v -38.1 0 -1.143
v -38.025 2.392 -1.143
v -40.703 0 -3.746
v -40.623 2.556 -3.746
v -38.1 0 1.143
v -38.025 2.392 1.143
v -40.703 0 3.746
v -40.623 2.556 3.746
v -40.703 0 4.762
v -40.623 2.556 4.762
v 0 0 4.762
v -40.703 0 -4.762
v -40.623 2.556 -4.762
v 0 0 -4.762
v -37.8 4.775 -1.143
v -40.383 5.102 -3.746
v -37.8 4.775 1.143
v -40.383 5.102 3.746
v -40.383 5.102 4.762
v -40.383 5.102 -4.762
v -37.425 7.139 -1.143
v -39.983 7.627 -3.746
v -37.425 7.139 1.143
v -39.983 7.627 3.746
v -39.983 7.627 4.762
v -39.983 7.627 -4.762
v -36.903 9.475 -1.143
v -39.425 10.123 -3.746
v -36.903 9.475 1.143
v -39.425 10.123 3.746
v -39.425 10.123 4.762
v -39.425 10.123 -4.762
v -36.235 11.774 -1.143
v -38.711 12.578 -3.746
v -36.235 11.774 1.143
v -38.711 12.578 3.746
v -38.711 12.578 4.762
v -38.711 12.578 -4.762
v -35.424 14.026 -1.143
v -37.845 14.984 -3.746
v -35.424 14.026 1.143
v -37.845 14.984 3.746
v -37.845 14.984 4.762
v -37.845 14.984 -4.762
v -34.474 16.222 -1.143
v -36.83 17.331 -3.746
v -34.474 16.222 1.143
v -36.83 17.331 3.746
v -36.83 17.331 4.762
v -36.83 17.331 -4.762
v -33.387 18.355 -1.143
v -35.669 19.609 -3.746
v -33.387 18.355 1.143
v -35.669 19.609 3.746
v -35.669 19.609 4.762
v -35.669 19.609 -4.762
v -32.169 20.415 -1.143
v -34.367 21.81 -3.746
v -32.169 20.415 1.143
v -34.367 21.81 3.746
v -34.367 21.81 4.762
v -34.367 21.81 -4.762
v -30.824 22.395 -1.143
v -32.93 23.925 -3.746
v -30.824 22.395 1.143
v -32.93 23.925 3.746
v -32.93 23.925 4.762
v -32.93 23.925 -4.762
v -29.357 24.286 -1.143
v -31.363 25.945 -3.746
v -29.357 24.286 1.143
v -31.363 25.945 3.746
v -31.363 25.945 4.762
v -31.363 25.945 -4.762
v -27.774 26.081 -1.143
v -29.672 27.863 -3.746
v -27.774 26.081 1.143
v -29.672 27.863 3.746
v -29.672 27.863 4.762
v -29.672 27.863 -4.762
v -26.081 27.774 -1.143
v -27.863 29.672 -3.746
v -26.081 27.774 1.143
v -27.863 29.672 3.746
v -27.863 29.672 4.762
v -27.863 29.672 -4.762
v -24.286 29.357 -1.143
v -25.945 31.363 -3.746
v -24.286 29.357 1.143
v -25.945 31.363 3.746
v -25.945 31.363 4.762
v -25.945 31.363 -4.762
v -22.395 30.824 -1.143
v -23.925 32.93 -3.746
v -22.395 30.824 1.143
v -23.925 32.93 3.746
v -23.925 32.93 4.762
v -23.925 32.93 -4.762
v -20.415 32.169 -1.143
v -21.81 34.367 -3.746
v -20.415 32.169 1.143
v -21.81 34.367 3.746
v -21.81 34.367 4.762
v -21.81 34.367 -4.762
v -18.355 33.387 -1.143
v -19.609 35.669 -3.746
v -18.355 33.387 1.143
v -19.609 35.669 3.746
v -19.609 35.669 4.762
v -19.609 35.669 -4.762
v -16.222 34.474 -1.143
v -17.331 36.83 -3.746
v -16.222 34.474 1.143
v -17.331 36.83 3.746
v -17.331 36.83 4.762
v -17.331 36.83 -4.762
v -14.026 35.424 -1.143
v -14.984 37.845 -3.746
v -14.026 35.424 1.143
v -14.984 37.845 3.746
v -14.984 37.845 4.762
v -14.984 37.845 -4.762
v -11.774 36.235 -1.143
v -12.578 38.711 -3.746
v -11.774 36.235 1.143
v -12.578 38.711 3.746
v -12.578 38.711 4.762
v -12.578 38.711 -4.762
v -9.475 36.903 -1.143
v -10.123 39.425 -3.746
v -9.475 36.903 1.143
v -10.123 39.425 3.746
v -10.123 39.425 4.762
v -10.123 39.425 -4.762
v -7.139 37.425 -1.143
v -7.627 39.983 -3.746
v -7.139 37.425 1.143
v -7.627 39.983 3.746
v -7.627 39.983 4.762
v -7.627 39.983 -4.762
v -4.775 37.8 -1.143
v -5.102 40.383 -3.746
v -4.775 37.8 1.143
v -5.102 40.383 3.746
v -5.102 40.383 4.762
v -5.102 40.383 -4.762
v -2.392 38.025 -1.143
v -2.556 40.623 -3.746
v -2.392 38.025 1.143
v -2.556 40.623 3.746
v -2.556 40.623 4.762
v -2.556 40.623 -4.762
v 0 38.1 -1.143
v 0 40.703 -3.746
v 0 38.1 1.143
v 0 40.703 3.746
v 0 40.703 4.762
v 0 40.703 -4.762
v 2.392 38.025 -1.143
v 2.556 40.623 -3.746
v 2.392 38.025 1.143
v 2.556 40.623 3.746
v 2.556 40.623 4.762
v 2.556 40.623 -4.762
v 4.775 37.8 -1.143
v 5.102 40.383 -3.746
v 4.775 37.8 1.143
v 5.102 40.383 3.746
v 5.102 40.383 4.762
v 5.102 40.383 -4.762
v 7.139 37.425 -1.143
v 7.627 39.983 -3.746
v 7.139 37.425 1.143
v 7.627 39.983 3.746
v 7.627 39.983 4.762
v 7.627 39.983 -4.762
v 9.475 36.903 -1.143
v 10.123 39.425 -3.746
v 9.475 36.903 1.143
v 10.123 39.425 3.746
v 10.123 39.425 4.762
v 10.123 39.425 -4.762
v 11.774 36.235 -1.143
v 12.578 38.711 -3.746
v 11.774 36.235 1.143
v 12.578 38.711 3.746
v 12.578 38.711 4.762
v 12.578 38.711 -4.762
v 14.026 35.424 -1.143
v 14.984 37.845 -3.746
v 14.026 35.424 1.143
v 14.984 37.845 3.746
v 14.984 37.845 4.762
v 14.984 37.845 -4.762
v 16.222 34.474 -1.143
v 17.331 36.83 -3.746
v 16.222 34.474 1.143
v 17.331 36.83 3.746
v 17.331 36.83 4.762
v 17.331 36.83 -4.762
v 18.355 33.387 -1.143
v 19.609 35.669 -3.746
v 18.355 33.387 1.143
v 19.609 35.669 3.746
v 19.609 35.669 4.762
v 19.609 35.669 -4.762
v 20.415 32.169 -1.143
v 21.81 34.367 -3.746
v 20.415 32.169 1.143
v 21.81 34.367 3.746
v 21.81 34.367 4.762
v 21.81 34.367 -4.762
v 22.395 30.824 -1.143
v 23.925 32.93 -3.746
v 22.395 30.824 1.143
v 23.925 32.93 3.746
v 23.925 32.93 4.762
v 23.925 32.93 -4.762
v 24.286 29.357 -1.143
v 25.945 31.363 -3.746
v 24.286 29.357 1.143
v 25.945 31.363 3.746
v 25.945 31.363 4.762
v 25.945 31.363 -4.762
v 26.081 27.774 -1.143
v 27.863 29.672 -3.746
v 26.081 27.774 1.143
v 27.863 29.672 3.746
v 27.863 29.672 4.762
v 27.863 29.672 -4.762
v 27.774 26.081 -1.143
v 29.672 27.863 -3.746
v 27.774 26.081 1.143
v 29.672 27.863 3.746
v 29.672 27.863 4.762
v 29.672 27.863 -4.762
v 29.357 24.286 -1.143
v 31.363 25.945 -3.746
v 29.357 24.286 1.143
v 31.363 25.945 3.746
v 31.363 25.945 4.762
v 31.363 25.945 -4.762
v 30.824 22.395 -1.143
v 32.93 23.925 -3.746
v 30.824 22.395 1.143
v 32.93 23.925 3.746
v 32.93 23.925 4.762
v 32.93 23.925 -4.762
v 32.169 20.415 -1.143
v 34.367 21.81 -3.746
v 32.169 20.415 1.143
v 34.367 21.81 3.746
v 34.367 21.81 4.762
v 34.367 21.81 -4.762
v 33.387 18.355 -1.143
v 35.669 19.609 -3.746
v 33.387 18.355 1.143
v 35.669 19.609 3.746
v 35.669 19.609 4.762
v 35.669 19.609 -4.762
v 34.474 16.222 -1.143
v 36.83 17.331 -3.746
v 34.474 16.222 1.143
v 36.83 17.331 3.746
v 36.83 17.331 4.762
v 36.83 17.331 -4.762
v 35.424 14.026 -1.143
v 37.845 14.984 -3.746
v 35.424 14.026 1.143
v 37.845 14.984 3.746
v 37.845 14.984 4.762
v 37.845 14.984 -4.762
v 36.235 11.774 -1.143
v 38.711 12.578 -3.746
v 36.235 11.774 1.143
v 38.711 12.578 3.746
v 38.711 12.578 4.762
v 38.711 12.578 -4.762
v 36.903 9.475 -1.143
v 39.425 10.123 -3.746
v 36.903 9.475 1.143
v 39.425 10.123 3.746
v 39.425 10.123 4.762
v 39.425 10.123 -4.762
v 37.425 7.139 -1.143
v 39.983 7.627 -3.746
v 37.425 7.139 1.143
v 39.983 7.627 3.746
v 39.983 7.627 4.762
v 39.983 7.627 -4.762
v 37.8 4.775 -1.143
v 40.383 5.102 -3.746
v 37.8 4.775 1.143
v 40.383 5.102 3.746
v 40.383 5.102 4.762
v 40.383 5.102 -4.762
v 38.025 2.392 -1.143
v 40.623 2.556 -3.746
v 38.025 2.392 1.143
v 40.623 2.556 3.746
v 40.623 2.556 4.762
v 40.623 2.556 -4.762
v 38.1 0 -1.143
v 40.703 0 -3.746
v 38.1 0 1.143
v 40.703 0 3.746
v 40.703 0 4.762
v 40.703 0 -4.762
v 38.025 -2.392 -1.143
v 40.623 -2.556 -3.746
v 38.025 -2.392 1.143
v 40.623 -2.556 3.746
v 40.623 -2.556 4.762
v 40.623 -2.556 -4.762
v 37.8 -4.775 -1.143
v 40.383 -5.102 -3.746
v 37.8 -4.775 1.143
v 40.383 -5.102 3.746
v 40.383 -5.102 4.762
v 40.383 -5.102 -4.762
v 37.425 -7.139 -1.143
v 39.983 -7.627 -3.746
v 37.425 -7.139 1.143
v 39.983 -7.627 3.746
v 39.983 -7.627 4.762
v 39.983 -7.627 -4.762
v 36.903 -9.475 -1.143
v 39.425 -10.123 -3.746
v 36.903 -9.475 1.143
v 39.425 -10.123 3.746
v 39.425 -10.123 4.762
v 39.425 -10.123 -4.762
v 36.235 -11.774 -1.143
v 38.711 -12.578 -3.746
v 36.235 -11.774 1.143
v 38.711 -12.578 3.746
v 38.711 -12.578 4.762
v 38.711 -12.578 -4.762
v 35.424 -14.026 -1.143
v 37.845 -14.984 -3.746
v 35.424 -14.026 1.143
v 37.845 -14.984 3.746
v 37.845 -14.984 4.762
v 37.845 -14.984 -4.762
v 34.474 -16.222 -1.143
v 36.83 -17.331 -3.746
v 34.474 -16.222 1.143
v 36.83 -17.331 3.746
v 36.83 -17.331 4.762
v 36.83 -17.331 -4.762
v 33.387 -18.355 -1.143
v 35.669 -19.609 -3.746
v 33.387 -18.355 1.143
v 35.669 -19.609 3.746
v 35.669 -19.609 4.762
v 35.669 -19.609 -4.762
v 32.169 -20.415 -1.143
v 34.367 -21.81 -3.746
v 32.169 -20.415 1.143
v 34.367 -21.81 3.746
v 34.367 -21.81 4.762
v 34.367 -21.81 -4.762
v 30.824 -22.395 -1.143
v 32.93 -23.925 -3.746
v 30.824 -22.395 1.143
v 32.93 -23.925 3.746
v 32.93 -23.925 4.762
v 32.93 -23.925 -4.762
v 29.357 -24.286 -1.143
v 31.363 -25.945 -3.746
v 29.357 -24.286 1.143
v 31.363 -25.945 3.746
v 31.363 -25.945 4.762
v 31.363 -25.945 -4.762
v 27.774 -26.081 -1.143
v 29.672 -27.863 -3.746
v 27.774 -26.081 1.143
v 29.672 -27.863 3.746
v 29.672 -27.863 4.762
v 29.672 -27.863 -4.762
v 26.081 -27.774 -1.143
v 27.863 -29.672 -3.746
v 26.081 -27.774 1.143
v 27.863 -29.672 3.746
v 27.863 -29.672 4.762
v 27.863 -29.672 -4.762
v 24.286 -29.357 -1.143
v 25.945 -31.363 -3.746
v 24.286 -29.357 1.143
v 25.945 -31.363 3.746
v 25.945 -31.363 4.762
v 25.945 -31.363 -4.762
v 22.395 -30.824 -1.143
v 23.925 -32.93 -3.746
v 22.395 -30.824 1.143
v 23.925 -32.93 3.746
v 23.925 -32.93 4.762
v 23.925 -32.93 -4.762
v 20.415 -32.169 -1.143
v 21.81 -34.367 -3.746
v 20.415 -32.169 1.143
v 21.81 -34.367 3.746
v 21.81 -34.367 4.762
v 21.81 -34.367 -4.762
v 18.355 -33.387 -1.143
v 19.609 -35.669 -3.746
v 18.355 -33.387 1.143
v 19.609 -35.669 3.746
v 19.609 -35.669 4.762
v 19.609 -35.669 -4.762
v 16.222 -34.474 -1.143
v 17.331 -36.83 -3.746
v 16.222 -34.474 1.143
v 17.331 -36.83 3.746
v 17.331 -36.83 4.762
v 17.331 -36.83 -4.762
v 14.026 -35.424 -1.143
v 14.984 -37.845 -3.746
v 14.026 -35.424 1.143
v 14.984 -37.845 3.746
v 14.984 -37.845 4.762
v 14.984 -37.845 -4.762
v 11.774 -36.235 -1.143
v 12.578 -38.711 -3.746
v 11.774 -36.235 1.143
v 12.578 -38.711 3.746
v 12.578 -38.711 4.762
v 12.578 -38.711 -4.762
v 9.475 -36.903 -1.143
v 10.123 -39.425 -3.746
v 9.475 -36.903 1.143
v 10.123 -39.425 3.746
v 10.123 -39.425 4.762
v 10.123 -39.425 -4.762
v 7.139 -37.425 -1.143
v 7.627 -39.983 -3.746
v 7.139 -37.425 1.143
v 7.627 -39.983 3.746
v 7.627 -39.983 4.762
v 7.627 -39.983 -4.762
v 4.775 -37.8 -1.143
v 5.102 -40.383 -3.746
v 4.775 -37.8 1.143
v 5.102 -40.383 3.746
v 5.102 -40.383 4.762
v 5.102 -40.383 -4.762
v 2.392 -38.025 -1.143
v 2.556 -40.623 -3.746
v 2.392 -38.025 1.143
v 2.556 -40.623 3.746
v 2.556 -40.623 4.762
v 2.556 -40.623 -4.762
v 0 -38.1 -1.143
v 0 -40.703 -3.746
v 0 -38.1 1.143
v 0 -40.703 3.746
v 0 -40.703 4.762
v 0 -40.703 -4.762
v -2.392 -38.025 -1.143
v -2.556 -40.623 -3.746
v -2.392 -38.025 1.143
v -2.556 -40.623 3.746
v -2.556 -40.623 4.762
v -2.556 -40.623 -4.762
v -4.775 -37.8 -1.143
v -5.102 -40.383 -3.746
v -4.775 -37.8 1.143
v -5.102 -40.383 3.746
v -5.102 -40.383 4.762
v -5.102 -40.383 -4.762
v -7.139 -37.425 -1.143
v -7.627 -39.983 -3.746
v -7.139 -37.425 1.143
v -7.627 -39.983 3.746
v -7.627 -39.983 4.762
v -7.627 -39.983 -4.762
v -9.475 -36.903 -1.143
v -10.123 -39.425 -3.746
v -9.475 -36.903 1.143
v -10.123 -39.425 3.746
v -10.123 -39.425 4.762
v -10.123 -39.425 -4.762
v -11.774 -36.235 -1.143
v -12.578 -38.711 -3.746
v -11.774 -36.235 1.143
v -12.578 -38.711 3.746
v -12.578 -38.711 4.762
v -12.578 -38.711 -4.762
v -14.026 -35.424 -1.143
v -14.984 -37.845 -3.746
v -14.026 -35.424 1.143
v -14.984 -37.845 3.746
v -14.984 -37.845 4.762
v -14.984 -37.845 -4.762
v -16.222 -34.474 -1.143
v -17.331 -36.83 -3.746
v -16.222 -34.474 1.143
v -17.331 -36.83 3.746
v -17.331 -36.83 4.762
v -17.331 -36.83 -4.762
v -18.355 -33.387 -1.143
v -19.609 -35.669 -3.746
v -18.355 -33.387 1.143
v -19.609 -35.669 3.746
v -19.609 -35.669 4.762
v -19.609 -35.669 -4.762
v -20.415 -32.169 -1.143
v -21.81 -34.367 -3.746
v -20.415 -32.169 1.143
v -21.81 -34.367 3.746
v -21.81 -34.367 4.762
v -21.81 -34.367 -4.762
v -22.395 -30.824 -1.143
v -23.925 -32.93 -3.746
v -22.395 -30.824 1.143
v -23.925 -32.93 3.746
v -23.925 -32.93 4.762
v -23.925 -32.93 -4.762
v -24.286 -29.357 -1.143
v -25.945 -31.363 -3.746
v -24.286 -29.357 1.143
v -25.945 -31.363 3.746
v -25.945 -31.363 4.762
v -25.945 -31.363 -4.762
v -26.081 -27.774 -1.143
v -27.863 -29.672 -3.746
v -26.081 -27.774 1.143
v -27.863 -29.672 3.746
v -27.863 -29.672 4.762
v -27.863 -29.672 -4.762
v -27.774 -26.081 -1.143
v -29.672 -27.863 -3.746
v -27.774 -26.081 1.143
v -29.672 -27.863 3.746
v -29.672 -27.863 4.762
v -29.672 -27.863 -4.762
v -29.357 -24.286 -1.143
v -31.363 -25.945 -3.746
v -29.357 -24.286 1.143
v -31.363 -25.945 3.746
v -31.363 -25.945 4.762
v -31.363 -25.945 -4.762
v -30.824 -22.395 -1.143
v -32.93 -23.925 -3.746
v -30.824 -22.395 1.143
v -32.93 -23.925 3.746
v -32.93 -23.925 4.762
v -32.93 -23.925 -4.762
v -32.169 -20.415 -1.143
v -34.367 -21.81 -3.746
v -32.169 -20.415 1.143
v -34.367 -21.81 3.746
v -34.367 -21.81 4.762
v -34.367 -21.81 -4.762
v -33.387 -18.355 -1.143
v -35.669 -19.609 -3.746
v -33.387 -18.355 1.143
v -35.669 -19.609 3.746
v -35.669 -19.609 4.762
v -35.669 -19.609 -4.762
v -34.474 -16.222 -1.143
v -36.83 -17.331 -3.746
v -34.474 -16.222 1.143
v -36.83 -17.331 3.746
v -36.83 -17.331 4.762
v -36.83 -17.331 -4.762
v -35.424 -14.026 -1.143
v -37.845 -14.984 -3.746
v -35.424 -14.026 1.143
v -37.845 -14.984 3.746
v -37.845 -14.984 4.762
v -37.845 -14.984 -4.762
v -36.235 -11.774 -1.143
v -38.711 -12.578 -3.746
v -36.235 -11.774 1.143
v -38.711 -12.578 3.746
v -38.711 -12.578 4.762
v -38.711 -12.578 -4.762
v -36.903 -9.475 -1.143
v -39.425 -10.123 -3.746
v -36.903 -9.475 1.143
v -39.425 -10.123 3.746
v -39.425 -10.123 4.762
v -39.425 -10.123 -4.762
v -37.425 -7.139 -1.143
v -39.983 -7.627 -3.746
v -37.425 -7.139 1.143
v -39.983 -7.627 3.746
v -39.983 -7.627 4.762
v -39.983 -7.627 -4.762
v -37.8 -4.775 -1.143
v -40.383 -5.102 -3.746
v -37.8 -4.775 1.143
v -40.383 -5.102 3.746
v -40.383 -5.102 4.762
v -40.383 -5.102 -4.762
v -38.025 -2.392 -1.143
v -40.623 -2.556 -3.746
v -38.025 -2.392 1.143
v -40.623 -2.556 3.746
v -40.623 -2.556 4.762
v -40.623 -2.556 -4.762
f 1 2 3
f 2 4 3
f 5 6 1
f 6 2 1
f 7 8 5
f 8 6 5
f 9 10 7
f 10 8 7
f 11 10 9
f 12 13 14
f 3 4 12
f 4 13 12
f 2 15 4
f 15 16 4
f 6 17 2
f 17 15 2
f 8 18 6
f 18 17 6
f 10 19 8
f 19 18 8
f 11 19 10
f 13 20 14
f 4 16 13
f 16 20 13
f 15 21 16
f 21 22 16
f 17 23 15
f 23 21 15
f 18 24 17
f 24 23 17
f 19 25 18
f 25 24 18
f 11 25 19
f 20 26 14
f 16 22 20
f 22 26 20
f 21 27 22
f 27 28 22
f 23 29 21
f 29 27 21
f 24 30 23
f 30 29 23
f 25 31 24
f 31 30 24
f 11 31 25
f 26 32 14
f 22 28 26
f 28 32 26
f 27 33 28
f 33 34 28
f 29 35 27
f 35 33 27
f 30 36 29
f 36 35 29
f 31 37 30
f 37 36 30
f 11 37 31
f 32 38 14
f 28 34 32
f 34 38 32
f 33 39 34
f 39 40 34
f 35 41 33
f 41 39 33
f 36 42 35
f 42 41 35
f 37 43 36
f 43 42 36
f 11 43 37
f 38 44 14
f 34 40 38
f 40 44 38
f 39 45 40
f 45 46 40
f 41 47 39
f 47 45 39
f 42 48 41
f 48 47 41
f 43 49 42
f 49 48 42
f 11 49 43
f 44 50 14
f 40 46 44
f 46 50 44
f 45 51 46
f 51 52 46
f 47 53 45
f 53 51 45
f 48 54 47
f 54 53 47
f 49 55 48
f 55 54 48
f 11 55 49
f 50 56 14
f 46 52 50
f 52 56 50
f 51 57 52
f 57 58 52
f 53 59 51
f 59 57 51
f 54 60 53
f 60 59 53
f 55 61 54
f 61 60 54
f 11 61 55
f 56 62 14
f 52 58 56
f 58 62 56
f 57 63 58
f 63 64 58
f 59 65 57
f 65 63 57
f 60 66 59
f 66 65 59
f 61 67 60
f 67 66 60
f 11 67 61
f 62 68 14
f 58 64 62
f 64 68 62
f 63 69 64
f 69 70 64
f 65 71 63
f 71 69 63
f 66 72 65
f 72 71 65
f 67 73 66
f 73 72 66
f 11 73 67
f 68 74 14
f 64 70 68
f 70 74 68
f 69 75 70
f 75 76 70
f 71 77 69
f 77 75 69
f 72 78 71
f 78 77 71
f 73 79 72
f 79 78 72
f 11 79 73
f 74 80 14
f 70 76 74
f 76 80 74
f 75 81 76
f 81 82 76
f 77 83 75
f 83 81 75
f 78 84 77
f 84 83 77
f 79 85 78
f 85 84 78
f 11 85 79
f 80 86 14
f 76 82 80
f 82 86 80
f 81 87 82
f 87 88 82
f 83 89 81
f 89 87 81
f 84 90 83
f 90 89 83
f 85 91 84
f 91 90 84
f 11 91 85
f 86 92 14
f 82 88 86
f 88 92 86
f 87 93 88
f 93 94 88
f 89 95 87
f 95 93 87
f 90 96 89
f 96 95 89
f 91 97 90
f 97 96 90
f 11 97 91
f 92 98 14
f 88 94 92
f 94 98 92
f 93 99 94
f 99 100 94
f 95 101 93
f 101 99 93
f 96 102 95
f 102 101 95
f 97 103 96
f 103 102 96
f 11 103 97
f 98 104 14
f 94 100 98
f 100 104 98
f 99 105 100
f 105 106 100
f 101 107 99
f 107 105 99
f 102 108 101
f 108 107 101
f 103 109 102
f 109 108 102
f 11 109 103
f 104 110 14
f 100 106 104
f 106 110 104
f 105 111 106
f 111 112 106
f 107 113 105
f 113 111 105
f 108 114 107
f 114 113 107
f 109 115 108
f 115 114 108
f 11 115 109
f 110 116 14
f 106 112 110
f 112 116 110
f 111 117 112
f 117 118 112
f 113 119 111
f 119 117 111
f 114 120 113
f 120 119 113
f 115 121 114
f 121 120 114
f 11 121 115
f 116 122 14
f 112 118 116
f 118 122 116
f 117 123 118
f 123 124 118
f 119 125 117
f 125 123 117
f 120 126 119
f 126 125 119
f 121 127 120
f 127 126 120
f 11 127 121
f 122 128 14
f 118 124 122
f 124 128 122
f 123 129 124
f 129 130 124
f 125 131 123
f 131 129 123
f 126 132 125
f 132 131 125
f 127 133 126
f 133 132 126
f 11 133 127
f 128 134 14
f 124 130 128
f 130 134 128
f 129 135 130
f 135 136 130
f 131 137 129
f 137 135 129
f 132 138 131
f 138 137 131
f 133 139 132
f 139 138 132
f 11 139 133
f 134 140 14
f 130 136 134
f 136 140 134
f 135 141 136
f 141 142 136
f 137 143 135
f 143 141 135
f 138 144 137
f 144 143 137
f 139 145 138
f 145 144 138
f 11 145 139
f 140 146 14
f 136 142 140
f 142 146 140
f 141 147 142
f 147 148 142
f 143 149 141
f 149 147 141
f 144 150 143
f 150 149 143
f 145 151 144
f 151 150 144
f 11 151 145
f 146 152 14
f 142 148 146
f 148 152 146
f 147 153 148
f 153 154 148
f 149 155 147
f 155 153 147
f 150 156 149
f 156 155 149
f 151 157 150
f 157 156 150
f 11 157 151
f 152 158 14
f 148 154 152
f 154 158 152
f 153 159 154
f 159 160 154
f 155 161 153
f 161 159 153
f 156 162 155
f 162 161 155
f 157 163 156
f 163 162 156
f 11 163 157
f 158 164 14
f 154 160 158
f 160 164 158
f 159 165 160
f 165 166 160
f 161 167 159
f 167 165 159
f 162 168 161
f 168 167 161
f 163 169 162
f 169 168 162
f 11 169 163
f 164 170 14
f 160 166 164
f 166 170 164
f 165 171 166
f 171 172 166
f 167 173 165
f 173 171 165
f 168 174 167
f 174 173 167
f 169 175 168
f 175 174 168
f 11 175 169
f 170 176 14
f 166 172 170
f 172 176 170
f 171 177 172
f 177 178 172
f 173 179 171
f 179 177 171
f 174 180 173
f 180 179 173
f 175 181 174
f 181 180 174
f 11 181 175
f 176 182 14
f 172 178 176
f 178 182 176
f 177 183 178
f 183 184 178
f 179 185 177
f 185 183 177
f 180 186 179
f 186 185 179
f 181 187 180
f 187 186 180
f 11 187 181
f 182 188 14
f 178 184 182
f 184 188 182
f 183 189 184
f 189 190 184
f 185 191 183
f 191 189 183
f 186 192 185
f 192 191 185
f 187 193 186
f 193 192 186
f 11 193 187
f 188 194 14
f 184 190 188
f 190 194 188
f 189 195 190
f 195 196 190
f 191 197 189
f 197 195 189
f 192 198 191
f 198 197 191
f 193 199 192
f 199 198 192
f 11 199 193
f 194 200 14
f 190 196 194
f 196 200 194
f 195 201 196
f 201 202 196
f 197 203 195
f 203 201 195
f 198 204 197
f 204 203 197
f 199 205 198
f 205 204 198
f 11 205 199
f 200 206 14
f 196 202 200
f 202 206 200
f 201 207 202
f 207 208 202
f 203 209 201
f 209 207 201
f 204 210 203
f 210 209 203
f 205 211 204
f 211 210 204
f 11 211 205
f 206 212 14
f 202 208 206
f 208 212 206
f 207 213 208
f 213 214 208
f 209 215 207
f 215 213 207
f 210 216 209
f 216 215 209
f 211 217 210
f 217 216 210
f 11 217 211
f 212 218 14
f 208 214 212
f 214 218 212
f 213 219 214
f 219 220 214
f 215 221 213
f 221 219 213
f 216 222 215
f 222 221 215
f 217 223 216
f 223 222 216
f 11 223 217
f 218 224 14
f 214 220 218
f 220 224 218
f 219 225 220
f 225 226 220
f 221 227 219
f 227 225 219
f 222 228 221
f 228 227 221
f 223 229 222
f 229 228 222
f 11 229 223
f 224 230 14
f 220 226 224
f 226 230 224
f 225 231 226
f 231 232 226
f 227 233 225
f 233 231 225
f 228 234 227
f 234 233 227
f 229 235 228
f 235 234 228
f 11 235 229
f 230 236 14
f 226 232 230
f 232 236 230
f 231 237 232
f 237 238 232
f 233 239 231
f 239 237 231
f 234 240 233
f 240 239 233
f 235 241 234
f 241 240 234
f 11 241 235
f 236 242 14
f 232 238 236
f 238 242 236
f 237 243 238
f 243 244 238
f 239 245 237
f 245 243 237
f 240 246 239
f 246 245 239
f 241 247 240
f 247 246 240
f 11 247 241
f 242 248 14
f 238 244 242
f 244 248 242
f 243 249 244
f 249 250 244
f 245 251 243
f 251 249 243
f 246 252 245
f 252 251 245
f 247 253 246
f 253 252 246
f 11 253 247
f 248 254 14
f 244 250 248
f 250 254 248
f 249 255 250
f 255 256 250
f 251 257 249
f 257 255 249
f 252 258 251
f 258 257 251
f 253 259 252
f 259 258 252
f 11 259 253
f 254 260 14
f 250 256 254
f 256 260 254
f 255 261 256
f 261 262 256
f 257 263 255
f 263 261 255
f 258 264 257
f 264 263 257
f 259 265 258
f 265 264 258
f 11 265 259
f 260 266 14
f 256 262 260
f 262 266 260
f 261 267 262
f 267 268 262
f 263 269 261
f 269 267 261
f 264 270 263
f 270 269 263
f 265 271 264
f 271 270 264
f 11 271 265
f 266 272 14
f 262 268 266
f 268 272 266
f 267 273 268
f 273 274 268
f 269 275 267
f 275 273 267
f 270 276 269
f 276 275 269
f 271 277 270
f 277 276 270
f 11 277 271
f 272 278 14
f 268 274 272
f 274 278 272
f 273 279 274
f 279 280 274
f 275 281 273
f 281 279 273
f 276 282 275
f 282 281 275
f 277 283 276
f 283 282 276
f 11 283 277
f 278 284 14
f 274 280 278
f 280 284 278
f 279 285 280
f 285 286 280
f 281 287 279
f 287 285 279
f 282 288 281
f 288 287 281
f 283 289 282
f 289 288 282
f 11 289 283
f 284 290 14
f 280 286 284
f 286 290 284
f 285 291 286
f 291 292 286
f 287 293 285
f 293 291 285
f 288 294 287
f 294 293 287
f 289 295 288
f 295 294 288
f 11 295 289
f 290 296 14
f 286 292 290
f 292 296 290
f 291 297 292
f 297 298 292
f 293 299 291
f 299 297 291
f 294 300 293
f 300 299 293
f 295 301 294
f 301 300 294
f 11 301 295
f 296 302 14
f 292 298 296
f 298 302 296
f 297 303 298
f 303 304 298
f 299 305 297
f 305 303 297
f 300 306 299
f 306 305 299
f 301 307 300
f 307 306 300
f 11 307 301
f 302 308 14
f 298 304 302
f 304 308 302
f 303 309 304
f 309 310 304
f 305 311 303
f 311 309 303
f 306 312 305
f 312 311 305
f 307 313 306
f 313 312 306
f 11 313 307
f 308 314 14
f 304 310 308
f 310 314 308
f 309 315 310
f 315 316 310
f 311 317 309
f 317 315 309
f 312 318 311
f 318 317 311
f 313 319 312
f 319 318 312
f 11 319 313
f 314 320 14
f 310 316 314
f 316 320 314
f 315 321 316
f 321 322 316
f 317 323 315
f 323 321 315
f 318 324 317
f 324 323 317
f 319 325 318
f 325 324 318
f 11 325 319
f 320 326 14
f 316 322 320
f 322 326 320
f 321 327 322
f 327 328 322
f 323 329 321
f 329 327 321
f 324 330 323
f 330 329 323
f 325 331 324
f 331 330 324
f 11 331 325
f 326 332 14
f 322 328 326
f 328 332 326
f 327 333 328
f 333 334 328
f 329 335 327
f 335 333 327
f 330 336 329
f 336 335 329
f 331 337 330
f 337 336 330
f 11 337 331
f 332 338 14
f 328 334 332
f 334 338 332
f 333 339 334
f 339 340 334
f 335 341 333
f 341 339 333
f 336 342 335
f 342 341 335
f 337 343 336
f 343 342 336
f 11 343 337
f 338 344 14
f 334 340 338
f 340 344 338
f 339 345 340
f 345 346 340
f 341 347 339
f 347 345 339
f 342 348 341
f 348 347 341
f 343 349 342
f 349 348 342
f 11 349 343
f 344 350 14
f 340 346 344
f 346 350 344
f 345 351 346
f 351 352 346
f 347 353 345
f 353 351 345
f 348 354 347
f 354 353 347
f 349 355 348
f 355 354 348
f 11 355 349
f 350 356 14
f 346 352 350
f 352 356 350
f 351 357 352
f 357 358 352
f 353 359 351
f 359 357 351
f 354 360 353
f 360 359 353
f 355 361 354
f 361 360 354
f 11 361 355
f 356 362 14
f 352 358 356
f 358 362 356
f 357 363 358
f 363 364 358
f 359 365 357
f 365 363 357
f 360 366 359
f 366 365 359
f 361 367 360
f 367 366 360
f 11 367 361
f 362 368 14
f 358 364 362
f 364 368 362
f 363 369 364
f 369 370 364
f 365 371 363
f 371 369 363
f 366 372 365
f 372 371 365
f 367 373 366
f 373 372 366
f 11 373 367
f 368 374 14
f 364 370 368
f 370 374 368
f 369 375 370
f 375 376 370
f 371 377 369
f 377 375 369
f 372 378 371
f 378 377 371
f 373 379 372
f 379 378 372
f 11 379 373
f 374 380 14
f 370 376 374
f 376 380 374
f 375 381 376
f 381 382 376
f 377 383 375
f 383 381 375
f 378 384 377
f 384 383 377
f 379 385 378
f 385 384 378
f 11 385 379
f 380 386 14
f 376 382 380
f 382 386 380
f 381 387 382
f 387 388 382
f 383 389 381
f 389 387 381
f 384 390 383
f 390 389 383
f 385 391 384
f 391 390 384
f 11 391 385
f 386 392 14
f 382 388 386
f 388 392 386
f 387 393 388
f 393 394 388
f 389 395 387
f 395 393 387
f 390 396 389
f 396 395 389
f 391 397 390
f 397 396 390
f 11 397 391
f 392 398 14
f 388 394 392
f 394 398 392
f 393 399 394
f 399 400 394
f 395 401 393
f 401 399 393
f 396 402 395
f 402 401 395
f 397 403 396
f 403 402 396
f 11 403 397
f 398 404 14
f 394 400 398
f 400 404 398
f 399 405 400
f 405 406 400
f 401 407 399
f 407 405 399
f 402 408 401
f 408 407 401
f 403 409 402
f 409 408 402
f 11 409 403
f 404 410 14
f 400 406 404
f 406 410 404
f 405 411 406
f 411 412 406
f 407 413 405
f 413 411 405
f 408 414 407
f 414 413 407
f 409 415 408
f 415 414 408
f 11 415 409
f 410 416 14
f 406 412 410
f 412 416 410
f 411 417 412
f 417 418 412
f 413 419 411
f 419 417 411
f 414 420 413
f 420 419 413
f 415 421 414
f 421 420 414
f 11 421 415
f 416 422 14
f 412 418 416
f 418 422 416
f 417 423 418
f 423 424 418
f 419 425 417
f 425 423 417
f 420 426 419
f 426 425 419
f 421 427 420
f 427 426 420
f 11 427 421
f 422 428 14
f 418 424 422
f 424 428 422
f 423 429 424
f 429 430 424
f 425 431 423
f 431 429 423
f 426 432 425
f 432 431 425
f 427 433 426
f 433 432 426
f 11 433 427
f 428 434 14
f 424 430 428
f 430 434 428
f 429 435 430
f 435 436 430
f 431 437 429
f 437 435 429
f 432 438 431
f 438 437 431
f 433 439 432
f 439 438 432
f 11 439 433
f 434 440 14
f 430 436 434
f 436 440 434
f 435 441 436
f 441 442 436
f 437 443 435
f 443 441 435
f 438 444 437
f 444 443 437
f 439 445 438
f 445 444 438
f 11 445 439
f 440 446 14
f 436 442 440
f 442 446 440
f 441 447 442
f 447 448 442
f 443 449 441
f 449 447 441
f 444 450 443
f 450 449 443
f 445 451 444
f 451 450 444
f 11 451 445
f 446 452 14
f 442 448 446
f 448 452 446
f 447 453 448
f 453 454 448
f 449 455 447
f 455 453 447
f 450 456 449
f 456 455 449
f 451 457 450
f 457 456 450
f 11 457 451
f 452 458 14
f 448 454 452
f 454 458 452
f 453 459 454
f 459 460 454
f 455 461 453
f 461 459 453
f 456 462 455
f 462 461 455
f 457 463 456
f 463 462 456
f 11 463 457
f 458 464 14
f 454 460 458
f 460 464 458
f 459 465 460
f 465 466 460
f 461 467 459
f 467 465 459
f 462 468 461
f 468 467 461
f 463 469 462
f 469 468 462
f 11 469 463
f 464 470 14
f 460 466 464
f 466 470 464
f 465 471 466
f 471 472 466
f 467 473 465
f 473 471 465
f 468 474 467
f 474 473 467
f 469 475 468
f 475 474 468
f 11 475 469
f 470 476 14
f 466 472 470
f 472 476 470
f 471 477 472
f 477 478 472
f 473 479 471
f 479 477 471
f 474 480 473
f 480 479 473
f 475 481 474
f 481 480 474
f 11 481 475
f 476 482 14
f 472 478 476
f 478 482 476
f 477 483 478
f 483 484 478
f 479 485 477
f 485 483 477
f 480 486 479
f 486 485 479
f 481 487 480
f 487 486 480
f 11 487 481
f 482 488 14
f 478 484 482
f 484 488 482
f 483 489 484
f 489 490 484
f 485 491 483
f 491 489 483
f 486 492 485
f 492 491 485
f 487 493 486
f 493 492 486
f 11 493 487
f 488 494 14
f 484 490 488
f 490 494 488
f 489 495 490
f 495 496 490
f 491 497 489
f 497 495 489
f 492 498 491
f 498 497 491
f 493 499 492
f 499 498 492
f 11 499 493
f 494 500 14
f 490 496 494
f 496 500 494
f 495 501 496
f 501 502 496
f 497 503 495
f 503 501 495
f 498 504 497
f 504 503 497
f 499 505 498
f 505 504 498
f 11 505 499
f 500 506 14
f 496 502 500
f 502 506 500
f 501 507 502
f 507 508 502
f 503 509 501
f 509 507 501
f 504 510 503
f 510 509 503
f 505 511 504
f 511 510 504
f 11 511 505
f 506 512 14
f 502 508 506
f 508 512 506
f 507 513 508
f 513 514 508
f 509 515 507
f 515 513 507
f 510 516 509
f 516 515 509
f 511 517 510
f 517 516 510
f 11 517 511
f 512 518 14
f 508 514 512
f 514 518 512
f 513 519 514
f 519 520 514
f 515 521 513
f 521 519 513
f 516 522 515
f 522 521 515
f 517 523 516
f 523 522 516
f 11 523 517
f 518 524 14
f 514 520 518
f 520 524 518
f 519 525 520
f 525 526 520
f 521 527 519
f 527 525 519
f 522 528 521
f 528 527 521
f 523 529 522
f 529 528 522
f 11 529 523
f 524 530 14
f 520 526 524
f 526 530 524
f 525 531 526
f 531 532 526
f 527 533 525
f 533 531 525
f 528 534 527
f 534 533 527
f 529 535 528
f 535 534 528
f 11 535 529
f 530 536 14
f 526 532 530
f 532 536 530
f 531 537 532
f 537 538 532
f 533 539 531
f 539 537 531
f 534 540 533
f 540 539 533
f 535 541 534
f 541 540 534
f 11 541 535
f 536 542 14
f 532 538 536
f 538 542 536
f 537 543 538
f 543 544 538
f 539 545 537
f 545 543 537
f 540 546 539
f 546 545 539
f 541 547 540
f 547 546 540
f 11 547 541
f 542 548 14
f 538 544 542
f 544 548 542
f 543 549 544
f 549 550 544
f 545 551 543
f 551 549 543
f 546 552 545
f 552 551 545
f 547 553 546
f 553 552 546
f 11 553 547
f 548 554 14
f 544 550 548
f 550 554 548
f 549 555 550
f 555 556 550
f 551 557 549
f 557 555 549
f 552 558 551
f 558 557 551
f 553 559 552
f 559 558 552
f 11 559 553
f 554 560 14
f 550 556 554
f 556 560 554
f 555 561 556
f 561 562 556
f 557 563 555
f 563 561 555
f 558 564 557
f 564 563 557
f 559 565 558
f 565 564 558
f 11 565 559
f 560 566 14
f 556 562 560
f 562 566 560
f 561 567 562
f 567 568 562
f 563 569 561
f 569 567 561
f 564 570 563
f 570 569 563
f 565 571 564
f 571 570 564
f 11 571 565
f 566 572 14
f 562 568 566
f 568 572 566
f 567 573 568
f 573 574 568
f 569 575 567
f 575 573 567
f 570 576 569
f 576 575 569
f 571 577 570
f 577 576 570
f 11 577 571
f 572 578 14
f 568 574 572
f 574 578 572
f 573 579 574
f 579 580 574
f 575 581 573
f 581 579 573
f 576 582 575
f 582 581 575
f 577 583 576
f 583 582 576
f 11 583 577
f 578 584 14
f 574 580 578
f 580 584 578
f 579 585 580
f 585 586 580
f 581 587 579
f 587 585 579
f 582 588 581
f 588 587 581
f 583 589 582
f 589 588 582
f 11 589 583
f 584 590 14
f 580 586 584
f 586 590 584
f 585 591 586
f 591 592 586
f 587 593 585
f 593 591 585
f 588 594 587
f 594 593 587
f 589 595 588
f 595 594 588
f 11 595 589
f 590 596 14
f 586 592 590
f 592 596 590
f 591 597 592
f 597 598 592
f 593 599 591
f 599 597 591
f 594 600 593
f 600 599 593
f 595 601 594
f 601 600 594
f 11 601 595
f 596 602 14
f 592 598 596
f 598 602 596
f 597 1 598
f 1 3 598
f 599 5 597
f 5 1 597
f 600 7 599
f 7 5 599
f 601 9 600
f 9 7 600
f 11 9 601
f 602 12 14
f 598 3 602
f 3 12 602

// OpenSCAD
//
// Parametric design for a pulley with holes compatible with Actobotics 0.770"
// servo horns, with a center hole to permit subsequent attachment of horn to servo
// by feeding through a screw for the shaft.
//
// This work is licensed under the Creative Commons Attribution-ShareAlike 4.0
// International License. To view a copy of this license, visit
// http://creativecommons.org/licenses/by-sa/4.0/ or send a letter to
// Creative Commons, PO Box 1866, Mountain View, CA 94042, USA.
//
// Tun up precision = slower render time.
$fn = 100;

// Values specified in inches ...
mmPerInch = 25.4;

//
// Parameters for the profile of the pulley.  We revolve the profile around the Z-axis to produce the pulley.
//
// The pulley is size off of the pulley track diameter (e.g. pulleyInsideDiam), because this is what matters
// for translating rotation to linear distance.  The side walls are there just to keep to string from falling
// off the pulley and the overhang angle in there to permit this part to be FDM printable.  Additionally, 
// because we don't want the outside edge to be sharp, a lipThickness is added in ... because if the string 
// falls outside of the track and then engages, you don't want fraying.
//

pulleyInsideDiam = 3.0 * mmPerInch;
thick = 0.375 * mmPerInch;             // overall thickness
lipThickness = 0.040 * mmPerInch;      // outer edge flat portion - so we don't have a sharp edge
slotWidth = 0.090 * mmPerInch;
slotOverhangAngle = 45.0;              // degrees, overhangs should be less than or equal to 45 degrees

// Thickness of the overhang is half diff in thick and slotWidth
alpha = ( (thick - slotWidth) / 2 )  - lipThickness;

module pulleyProfile()
{
   polygon(points = [ 
      [0, slotWidth/2],                                                               // start of slot cut out
      [0, thick/2],                                                                   // top center
      [pulleyInsideDiam/2 + alpha * tan(slotOverhangAngle), thick/2],                 // top outside edge
      [pulleyInsideDiam/2 + alpha * tan(slotOverhangAngle), thick/2 - lipThickness],  // top inside edge
      [pulleyInsideDiam/2, slotWidth/2],                                              // top of inside slot
      [pulleyInsideDiam/2, -slotWidth/2],                                             // bottom of inside slot
      [pulleyInsideDiam/2 + alpha * tan(slotOverhangAngle), -thick/2 + lipThickness], // bottom inside edge
      [pulleyInsideDiam/2 + alpha * tan(slotOverhangAngle), -thick/2],                // bottom outside edge
      [0, -thick/2],                                                                  // bottom center
      [0, -slotWidth/2],                                                              // end of slot cut out
   ]);
}

rotate_extrude($fn = 100) {
   pulleyProfile();
}
